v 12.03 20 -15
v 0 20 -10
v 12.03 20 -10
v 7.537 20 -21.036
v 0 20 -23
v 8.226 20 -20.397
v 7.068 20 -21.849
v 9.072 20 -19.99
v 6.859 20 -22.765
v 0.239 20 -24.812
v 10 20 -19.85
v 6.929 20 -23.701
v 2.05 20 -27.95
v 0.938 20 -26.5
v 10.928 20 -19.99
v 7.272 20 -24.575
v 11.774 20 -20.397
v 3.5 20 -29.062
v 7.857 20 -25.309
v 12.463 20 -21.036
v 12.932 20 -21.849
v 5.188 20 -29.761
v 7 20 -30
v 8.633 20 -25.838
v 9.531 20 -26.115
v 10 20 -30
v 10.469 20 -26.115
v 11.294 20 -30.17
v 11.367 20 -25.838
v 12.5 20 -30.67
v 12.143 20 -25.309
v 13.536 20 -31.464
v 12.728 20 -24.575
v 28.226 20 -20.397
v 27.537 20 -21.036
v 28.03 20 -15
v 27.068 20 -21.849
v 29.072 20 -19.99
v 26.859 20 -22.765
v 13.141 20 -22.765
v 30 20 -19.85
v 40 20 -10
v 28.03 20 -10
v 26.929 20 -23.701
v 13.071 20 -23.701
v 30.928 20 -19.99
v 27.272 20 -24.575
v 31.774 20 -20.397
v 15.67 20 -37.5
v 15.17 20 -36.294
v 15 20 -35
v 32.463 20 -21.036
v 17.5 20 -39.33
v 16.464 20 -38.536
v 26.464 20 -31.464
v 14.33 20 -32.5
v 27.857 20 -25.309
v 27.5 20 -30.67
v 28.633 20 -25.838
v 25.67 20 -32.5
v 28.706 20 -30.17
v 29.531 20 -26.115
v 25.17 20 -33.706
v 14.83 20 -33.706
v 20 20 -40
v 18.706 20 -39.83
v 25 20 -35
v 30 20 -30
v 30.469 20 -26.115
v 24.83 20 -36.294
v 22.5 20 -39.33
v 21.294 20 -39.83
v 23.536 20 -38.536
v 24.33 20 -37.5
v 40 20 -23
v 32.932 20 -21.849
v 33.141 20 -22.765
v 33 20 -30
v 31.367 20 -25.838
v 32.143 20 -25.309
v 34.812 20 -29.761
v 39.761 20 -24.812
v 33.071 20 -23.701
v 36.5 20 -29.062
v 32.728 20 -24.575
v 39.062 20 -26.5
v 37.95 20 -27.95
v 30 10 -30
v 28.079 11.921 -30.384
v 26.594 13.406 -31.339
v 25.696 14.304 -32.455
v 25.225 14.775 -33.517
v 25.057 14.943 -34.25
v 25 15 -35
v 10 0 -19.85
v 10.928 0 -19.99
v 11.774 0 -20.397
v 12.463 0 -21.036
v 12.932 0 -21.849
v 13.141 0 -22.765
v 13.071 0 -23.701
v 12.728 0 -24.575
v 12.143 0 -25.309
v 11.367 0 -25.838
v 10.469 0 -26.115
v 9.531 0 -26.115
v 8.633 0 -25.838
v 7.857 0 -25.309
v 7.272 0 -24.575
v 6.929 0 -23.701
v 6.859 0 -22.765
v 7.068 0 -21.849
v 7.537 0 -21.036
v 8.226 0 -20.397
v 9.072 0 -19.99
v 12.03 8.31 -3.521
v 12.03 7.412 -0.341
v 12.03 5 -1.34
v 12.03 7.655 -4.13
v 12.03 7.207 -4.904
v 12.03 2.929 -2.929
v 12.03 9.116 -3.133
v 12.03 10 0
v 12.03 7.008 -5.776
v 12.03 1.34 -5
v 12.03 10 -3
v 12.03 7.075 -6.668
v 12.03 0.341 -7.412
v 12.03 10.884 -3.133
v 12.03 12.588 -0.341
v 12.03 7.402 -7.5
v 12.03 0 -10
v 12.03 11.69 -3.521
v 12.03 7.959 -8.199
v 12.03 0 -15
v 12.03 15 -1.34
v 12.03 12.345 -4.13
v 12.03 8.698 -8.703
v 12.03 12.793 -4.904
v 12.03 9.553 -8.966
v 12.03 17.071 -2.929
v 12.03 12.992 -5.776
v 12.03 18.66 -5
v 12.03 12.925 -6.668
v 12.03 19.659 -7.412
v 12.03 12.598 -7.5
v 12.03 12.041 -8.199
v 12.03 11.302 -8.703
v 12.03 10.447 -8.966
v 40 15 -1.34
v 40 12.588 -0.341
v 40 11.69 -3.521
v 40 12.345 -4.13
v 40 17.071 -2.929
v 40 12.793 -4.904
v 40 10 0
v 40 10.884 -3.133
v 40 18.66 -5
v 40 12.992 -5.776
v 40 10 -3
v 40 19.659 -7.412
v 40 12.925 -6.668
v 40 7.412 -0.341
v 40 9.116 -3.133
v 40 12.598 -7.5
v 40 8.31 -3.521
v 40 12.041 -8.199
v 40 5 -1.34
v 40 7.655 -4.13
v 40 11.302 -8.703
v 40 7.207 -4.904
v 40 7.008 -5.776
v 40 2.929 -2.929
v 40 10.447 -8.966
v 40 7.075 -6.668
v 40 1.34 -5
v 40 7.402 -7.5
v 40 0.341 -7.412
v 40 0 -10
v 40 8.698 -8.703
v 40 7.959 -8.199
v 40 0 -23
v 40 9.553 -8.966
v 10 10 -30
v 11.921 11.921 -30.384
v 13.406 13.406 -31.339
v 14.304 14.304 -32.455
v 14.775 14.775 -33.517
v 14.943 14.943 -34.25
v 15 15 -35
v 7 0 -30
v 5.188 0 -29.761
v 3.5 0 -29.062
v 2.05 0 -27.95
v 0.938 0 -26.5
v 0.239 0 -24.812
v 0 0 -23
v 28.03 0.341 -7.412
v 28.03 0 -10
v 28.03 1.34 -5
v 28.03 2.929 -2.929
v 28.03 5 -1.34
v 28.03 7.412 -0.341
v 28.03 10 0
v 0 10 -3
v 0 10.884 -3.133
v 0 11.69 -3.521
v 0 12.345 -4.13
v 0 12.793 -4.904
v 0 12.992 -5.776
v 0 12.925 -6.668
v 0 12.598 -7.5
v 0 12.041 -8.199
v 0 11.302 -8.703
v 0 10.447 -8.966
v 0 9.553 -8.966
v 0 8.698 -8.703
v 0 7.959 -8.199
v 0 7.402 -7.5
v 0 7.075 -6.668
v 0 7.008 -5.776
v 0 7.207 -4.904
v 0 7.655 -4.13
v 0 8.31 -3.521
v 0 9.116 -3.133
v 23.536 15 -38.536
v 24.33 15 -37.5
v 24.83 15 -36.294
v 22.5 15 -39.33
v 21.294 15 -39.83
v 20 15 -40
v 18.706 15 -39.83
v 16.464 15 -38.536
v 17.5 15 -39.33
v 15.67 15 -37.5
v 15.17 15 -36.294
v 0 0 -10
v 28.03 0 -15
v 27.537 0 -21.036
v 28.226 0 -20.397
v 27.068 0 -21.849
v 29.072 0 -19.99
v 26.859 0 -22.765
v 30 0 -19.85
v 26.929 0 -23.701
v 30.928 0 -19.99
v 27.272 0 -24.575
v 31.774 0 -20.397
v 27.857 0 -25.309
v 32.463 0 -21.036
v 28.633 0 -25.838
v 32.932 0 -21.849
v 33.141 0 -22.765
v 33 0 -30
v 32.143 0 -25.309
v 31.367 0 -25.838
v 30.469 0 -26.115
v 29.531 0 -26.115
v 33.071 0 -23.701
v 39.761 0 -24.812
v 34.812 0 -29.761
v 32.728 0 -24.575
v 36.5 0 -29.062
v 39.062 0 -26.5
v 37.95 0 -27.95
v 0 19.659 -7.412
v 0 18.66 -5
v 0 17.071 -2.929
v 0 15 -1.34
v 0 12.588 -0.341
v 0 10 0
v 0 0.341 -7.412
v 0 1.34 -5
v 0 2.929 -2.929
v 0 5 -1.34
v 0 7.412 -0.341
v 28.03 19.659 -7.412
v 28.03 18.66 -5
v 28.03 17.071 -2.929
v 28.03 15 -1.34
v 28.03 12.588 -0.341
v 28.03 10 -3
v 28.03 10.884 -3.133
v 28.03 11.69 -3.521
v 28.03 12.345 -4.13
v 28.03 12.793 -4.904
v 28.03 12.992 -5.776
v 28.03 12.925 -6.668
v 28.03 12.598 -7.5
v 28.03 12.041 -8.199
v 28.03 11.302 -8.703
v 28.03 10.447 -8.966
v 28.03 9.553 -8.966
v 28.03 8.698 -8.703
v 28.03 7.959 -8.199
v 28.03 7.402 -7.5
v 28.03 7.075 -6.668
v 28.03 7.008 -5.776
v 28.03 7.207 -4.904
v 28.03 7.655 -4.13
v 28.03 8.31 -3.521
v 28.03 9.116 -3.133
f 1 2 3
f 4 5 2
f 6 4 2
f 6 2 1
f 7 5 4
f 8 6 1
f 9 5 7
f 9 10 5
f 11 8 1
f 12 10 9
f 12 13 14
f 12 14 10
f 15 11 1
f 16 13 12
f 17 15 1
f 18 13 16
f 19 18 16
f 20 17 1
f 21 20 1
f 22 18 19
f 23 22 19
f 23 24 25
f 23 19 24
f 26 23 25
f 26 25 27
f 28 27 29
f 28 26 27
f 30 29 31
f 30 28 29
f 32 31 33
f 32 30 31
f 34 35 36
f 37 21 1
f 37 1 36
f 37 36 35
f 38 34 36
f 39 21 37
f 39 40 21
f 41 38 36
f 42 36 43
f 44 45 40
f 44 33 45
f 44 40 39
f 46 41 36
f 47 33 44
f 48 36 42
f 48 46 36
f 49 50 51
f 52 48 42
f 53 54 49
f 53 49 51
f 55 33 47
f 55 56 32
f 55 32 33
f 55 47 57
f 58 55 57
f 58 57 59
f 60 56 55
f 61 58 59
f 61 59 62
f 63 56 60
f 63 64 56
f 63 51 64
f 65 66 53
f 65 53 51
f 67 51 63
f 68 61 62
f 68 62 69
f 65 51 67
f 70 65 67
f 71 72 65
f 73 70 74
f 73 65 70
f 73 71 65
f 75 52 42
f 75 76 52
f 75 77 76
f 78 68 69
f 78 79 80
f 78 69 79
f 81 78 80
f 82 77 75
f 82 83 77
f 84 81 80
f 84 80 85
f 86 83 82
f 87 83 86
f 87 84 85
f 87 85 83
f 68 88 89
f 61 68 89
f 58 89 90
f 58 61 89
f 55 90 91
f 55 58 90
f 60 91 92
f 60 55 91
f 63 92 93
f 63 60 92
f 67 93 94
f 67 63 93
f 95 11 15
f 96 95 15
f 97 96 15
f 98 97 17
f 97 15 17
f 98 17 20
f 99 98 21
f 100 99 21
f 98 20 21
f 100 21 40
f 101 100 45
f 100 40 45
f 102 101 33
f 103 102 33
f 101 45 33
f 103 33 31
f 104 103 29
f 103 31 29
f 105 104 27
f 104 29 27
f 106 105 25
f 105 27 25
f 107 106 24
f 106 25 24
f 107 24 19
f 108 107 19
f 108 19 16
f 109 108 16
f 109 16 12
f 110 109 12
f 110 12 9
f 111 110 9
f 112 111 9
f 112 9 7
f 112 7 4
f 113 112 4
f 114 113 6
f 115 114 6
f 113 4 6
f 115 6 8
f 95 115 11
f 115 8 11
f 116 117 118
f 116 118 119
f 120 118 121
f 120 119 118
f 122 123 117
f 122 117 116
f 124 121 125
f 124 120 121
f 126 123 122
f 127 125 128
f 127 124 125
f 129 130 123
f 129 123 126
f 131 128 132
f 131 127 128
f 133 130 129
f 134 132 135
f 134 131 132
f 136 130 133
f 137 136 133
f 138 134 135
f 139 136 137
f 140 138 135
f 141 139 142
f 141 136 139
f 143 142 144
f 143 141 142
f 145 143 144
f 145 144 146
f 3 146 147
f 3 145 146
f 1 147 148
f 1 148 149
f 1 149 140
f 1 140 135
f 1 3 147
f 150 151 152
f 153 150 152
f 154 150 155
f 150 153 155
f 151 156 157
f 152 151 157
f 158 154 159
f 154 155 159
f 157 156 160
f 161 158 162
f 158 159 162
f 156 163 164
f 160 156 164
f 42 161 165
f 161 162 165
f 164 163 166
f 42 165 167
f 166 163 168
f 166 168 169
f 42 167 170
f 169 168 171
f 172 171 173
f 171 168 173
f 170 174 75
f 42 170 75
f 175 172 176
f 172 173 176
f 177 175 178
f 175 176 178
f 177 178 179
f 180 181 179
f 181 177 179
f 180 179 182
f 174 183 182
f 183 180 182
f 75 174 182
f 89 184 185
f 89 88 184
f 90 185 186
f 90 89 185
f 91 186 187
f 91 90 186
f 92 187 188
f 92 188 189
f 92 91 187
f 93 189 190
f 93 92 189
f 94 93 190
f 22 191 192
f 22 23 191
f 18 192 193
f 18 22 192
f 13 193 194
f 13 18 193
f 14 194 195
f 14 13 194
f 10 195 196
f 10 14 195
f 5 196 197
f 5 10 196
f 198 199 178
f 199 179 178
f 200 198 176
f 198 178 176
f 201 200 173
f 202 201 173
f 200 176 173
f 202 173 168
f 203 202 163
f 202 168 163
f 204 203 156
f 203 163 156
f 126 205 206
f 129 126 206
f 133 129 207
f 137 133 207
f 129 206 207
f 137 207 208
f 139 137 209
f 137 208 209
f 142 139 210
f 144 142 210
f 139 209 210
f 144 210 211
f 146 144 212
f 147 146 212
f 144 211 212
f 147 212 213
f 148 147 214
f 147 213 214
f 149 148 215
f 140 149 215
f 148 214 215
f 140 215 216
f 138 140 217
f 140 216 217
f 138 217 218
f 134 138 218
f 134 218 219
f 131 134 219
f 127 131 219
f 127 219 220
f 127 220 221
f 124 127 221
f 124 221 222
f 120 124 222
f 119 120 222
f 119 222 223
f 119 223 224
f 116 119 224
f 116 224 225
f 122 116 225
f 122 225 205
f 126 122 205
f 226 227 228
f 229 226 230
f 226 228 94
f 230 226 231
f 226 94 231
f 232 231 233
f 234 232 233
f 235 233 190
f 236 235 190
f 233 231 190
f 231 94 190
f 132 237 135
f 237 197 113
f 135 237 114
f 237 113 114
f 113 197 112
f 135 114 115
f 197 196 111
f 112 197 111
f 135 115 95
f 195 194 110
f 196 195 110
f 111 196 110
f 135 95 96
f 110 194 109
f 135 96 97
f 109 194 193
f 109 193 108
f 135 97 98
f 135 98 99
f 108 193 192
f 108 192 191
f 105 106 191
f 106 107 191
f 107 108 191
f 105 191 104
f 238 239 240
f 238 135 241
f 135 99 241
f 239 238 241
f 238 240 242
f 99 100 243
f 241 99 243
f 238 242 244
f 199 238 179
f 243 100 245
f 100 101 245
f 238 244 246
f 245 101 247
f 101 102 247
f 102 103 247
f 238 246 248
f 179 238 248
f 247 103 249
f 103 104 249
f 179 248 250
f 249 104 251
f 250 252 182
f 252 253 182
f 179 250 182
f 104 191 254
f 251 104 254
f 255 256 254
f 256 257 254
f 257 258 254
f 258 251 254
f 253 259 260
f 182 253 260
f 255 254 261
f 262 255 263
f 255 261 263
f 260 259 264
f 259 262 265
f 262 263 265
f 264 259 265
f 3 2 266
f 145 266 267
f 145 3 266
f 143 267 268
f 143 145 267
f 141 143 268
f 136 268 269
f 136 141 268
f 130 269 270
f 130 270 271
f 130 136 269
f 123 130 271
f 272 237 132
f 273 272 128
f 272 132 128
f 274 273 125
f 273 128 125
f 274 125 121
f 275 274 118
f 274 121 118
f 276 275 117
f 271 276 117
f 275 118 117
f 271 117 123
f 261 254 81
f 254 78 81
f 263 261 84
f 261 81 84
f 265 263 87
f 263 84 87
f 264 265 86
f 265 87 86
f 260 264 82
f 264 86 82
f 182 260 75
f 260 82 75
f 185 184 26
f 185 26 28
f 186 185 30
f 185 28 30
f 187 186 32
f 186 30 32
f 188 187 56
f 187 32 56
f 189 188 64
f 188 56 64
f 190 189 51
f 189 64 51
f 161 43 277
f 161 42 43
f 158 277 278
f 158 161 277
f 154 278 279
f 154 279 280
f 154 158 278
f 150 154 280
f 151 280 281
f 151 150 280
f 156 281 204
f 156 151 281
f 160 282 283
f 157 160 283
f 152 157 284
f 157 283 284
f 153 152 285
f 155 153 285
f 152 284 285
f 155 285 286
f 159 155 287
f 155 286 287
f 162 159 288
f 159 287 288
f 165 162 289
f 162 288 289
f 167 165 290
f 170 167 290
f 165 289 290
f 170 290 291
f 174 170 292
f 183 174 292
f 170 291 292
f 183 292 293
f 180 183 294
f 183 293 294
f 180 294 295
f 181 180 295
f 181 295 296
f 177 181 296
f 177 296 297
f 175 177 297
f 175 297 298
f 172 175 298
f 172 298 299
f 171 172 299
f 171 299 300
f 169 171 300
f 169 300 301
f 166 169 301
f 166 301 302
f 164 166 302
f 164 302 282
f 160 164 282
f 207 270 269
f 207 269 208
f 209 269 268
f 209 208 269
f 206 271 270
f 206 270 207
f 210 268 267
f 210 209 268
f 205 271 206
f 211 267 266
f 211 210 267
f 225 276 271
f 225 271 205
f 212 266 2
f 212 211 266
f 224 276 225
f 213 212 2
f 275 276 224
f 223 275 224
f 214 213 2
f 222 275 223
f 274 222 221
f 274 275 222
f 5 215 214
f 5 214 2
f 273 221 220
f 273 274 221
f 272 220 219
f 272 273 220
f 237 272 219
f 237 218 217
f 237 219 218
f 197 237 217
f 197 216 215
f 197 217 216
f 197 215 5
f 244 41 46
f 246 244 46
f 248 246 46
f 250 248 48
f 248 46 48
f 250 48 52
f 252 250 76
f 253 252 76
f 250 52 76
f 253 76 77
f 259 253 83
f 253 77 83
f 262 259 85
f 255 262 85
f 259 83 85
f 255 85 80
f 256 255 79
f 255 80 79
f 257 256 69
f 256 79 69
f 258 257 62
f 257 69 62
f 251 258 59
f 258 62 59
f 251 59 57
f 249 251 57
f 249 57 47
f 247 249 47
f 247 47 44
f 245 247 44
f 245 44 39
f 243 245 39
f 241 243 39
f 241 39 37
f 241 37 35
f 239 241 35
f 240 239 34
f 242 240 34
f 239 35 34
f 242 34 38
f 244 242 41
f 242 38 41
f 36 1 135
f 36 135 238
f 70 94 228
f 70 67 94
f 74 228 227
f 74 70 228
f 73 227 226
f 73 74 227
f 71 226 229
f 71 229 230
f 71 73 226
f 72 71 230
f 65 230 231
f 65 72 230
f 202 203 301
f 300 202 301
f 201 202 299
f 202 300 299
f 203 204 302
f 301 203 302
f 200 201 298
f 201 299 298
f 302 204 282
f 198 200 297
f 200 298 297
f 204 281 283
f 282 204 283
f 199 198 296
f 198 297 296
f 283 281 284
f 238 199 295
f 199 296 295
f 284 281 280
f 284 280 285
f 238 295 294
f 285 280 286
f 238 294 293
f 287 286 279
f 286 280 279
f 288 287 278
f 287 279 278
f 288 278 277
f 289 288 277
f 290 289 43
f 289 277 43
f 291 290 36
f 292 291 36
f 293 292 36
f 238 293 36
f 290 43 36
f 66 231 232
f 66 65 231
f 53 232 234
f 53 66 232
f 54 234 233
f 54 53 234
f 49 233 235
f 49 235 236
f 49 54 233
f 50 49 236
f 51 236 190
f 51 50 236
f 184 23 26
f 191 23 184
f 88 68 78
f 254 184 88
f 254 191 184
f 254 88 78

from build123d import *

# Parameters (mm, degrees)
SKETCH1_W           = 40
SKETCH1_H           = 30
BOSS_EXTRUDE1_DEPTH = 20
SKETCH2_R           = 3.15
SKETCH2_W           = 16
SKETCH2_H           = 15
CUT_EXTRUDE1_DEPTH  = 20
SKETCH3_W           = 10
SKETCH3_H           = 5
BOSS_EXTRUDE2_DEPTH = 10
FILLET3_R           = 5
FILLET4_R           = 5
SKETCH6_R           = 3
CUT_EXTRUDE3_DEPTH  = 140
FILLET5_R           = 10
FILLET6_R           = 5
FILLET7_R           = 7


with BuildPart() as part:
    # Sketch1 → Boss-Extrude1 (new body)
    with BuildSketch(Plane(origin=(0, 0, 0), x_dir=(1, 0, 0), z_dir=(0, 1, 0))):
        with Locations((20, 15)):
            Rectangle(SKETCH1_W, SKETCH1_H)
    extrude(amount=BOSS_EXTRUDE1_DEPTH)

    # Sketch2 → Cut-Extrude1 (cut)
    with BuildSketch(Plane(origin=(0, 20, 0), x_dir=(1, 0, 0), z_dir=(0, 1, 0))):
        with Locations(Location((10, 23, 0), (0, 0, 270))):
            Circle(SKETCH2_R)
        with Locations(Location((30, 23, 0), (0, 0, 270))):
            Circle(SKETCH2_R)
        with Locations((20.029547187, 7.5)):
            Rectangle(SKETCH2_W, SKETCH2_H)
    extrude(amount=-CUT_EXTRUDE1_DEPTH, mode=Mode.SUBTRACT)

    # Sketch3 → Boss-Extrude2 (add)
    with BuildSketch(Plane(origin=(0, 0, -30), x_dir=(-1, 0, 0), z_dir=(0, 0, -1))):
        with Locations((-20, 17.5)):
            Rectangle(SKETCH3_W, SKETCH3_H)
    extrude(amount=BOSS_EXTRUDE2_DEPTH)

    # Fillet3
    fillet3_edges = [part.edges().sort_by_distance(p)[0] for p in [
        (25, 17.5, -30),
        (15, 17.5, -30),
    ]]
    fillet(fillet3_edges, radius=FILLET3_R)

    # Fillet4
    fillet4_edges = [part.edges().sort_by_distance(p)[0] for p in [
        (20, 15, -30),
    ]]
    fillet(fillet4_edges, radius=FILLET4_R)

    # Sketch6 → Cut-Extrude3 (cut)
    with BuildSketch(Plane.ZY):
        with Locations((-6, 10)):
            Circle(SKETCH6_R)
    extrude(amount=-CUT_EXTRUDE3_DEPTH, mode=Mode.SUBTRACT)

    # Fillet5
    fillet5_edges = [part.edges().sort_by_distance(p)[0] for p in [
        (34.014773594, 20, 0),
        (34.014773594, 0, 0),
        (6.014773594, 0, 0),
        (6.014773594, 20, 0),
    ]]
    fillet(fillet5_edges, radius=FILLET5_R - 0.0001)  # a hair under: the kernel refuses the full size

    # Fillet6
    fillet6_edges = [part.edges().sort_by_distance(p)[0] for p in [
        (25, 17.5, -40),
        (15, 17.5, -40),
    ]]
    fillet(fillet6_edges, radius=FILLET6_R - 0.0001)  # a hair under: the kernel refuses the full size

    # Fillet7
    fillet7_edges = [part.edges().sort_by_distance(p)[0] for p in [
        (0, 10, -30),
        (40, 10, -30),
    ]]
    fillet(fillet7_edges, radius=FILLET7_R)


solid = part.part
